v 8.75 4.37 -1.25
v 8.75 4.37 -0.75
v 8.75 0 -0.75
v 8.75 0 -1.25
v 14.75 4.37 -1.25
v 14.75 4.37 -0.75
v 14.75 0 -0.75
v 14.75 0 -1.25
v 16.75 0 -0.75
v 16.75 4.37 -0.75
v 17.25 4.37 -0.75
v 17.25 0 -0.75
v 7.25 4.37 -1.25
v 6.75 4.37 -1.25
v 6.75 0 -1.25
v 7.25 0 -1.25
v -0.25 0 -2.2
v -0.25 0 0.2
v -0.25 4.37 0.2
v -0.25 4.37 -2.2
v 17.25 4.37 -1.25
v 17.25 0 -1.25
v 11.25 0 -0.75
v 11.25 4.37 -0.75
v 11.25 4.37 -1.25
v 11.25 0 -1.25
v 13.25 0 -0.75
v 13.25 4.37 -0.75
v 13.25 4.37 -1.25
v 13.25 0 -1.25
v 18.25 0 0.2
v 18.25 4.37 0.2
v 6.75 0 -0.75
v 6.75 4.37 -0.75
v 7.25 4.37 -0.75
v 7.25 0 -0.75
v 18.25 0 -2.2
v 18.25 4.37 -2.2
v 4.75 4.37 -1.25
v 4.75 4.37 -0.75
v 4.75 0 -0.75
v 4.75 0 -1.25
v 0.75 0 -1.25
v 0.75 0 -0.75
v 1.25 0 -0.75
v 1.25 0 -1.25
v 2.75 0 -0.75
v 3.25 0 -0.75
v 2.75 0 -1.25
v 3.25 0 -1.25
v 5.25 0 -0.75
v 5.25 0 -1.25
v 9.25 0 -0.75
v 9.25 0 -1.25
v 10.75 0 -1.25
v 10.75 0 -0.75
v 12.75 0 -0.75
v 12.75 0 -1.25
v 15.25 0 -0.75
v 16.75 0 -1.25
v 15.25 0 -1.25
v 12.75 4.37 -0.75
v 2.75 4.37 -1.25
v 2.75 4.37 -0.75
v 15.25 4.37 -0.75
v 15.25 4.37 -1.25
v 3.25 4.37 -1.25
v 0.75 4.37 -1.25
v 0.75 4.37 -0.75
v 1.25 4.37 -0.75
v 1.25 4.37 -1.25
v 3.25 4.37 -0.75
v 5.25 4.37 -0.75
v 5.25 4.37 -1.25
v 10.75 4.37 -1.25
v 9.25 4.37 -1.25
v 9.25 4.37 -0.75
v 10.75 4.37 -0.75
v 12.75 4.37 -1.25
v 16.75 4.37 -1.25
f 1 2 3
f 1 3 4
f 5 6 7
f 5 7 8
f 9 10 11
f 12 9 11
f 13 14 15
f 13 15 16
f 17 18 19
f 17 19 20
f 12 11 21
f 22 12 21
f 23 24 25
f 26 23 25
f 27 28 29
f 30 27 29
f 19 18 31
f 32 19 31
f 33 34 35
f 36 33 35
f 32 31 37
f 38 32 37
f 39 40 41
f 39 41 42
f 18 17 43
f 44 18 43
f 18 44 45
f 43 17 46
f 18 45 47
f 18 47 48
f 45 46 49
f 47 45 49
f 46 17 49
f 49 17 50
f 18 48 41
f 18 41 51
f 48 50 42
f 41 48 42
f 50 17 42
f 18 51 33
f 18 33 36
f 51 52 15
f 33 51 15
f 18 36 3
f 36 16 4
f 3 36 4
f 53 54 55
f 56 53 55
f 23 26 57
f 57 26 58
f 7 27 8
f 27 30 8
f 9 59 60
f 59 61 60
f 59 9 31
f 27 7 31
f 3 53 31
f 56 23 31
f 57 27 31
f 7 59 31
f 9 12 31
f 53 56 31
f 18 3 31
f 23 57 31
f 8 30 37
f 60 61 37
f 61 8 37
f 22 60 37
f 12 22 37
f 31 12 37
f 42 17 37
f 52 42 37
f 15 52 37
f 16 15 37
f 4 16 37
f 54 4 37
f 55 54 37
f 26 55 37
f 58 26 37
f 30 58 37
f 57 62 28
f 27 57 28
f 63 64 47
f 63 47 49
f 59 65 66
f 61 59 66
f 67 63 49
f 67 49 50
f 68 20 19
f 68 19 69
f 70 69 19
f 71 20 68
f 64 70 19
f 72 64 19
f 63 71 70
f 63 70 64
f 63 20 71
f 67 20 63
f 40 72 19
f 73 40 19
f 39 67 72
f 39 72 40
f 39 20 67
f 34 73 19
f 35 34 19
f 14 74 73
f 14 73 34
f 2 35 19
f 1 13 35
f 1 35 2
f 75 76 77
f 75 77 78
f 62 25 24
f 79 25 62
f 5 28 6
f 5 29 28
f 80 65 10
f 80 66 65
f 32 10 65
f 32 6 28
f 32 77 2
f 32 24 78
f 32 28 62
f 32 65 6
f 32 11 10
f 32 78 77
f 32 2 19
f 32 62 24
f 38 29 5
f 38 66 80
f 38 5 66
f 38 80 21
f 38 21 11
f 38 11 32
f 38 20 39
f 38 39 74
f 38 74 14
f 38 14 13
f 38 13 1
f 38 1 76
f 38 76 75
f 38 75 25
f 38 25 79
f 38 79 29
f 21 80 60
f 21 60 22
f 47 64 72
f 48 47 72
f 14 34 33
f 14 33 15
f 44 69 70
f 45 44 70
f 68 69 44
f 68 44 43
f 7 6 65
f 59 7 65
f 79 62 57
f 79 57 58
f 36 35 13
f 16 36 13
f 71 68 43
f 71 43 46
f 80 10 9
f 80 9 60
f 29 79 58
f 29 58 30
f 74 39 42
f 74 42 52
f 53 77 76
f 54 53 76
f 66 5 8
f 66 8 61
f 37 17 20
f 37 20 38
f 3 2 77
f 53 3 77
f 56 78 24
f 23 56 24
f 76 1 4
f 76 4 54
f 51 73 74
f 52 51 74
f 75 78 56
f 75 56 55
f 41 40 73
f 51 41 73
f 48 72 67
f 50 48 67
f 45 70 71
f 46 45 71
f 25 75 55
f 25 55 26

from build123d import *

# Parameters (mm, degrees)
SKETCH1_W           = 18.5
SKETCH1_H           = 2.4
BOSS_EXTRUDE1_DEPTH = 4.37
SKETCH2_W           = 0.5
SKETCH2_H           = 0.5
CUT_EXTRUDE1_DEPTH  = 4.37


with BuildPart() as part:
    # Sketch1 → Boss-Extrude1 (new body)
    with BuildSketch(Plane(origin=(0, 0, 0), x_dir=(1, 0, 0), z_dir=(0, 1, 0))):
        with Locations((9, 1)):
            Rectangle(SKETCH1_W, SKETCH1_H)
    extrude(amount=BOSS_EXTRUDE1_DEPTH)

    # Sketch2 → Cut-Extrude1 (cut)
    with BuildSketch(Plane(origin=(0, 4.37, 0), x_dir=(1, 0, 0), z_dir=(0, 1, 0))):
        with Locations((3, 1)):
            Rectangle(SKETCH2_W, SKETCH2_H)
        with Locations((1, 1)):
            Rectangle(SKETCH2_W, SKETCH2_H)
        with Locations((5, 1)):
            Rectangle(SKETCH2_W, SKETCH2_H)
        with Locations((7, 1)):
            Rectangle(SKETCH2_W, SKETCH2_H)
        with Locations((9, 1)):
            Rectangle(SKETCH2_W, SKETCH2_H)
        with Locations((11, 1)):
            Rectangle(SKETCH2_W, SKETCH2_H)
        with Locations((13, 1)):
            Rectangle(SKETCH2_W, SKETCH2_H)
        with Locations((15, 1)):
            Rectangle(SKETCH2_W, SKETCH2_H)
        with Locations((17, 1)):
            Rectangle(SKETCH2_W, SKETCH2_H)
    extrude(amount=-CUT_EXTRUDE1_DEPTH, mode=Mode.SUBTRACT)


solid = part.part
